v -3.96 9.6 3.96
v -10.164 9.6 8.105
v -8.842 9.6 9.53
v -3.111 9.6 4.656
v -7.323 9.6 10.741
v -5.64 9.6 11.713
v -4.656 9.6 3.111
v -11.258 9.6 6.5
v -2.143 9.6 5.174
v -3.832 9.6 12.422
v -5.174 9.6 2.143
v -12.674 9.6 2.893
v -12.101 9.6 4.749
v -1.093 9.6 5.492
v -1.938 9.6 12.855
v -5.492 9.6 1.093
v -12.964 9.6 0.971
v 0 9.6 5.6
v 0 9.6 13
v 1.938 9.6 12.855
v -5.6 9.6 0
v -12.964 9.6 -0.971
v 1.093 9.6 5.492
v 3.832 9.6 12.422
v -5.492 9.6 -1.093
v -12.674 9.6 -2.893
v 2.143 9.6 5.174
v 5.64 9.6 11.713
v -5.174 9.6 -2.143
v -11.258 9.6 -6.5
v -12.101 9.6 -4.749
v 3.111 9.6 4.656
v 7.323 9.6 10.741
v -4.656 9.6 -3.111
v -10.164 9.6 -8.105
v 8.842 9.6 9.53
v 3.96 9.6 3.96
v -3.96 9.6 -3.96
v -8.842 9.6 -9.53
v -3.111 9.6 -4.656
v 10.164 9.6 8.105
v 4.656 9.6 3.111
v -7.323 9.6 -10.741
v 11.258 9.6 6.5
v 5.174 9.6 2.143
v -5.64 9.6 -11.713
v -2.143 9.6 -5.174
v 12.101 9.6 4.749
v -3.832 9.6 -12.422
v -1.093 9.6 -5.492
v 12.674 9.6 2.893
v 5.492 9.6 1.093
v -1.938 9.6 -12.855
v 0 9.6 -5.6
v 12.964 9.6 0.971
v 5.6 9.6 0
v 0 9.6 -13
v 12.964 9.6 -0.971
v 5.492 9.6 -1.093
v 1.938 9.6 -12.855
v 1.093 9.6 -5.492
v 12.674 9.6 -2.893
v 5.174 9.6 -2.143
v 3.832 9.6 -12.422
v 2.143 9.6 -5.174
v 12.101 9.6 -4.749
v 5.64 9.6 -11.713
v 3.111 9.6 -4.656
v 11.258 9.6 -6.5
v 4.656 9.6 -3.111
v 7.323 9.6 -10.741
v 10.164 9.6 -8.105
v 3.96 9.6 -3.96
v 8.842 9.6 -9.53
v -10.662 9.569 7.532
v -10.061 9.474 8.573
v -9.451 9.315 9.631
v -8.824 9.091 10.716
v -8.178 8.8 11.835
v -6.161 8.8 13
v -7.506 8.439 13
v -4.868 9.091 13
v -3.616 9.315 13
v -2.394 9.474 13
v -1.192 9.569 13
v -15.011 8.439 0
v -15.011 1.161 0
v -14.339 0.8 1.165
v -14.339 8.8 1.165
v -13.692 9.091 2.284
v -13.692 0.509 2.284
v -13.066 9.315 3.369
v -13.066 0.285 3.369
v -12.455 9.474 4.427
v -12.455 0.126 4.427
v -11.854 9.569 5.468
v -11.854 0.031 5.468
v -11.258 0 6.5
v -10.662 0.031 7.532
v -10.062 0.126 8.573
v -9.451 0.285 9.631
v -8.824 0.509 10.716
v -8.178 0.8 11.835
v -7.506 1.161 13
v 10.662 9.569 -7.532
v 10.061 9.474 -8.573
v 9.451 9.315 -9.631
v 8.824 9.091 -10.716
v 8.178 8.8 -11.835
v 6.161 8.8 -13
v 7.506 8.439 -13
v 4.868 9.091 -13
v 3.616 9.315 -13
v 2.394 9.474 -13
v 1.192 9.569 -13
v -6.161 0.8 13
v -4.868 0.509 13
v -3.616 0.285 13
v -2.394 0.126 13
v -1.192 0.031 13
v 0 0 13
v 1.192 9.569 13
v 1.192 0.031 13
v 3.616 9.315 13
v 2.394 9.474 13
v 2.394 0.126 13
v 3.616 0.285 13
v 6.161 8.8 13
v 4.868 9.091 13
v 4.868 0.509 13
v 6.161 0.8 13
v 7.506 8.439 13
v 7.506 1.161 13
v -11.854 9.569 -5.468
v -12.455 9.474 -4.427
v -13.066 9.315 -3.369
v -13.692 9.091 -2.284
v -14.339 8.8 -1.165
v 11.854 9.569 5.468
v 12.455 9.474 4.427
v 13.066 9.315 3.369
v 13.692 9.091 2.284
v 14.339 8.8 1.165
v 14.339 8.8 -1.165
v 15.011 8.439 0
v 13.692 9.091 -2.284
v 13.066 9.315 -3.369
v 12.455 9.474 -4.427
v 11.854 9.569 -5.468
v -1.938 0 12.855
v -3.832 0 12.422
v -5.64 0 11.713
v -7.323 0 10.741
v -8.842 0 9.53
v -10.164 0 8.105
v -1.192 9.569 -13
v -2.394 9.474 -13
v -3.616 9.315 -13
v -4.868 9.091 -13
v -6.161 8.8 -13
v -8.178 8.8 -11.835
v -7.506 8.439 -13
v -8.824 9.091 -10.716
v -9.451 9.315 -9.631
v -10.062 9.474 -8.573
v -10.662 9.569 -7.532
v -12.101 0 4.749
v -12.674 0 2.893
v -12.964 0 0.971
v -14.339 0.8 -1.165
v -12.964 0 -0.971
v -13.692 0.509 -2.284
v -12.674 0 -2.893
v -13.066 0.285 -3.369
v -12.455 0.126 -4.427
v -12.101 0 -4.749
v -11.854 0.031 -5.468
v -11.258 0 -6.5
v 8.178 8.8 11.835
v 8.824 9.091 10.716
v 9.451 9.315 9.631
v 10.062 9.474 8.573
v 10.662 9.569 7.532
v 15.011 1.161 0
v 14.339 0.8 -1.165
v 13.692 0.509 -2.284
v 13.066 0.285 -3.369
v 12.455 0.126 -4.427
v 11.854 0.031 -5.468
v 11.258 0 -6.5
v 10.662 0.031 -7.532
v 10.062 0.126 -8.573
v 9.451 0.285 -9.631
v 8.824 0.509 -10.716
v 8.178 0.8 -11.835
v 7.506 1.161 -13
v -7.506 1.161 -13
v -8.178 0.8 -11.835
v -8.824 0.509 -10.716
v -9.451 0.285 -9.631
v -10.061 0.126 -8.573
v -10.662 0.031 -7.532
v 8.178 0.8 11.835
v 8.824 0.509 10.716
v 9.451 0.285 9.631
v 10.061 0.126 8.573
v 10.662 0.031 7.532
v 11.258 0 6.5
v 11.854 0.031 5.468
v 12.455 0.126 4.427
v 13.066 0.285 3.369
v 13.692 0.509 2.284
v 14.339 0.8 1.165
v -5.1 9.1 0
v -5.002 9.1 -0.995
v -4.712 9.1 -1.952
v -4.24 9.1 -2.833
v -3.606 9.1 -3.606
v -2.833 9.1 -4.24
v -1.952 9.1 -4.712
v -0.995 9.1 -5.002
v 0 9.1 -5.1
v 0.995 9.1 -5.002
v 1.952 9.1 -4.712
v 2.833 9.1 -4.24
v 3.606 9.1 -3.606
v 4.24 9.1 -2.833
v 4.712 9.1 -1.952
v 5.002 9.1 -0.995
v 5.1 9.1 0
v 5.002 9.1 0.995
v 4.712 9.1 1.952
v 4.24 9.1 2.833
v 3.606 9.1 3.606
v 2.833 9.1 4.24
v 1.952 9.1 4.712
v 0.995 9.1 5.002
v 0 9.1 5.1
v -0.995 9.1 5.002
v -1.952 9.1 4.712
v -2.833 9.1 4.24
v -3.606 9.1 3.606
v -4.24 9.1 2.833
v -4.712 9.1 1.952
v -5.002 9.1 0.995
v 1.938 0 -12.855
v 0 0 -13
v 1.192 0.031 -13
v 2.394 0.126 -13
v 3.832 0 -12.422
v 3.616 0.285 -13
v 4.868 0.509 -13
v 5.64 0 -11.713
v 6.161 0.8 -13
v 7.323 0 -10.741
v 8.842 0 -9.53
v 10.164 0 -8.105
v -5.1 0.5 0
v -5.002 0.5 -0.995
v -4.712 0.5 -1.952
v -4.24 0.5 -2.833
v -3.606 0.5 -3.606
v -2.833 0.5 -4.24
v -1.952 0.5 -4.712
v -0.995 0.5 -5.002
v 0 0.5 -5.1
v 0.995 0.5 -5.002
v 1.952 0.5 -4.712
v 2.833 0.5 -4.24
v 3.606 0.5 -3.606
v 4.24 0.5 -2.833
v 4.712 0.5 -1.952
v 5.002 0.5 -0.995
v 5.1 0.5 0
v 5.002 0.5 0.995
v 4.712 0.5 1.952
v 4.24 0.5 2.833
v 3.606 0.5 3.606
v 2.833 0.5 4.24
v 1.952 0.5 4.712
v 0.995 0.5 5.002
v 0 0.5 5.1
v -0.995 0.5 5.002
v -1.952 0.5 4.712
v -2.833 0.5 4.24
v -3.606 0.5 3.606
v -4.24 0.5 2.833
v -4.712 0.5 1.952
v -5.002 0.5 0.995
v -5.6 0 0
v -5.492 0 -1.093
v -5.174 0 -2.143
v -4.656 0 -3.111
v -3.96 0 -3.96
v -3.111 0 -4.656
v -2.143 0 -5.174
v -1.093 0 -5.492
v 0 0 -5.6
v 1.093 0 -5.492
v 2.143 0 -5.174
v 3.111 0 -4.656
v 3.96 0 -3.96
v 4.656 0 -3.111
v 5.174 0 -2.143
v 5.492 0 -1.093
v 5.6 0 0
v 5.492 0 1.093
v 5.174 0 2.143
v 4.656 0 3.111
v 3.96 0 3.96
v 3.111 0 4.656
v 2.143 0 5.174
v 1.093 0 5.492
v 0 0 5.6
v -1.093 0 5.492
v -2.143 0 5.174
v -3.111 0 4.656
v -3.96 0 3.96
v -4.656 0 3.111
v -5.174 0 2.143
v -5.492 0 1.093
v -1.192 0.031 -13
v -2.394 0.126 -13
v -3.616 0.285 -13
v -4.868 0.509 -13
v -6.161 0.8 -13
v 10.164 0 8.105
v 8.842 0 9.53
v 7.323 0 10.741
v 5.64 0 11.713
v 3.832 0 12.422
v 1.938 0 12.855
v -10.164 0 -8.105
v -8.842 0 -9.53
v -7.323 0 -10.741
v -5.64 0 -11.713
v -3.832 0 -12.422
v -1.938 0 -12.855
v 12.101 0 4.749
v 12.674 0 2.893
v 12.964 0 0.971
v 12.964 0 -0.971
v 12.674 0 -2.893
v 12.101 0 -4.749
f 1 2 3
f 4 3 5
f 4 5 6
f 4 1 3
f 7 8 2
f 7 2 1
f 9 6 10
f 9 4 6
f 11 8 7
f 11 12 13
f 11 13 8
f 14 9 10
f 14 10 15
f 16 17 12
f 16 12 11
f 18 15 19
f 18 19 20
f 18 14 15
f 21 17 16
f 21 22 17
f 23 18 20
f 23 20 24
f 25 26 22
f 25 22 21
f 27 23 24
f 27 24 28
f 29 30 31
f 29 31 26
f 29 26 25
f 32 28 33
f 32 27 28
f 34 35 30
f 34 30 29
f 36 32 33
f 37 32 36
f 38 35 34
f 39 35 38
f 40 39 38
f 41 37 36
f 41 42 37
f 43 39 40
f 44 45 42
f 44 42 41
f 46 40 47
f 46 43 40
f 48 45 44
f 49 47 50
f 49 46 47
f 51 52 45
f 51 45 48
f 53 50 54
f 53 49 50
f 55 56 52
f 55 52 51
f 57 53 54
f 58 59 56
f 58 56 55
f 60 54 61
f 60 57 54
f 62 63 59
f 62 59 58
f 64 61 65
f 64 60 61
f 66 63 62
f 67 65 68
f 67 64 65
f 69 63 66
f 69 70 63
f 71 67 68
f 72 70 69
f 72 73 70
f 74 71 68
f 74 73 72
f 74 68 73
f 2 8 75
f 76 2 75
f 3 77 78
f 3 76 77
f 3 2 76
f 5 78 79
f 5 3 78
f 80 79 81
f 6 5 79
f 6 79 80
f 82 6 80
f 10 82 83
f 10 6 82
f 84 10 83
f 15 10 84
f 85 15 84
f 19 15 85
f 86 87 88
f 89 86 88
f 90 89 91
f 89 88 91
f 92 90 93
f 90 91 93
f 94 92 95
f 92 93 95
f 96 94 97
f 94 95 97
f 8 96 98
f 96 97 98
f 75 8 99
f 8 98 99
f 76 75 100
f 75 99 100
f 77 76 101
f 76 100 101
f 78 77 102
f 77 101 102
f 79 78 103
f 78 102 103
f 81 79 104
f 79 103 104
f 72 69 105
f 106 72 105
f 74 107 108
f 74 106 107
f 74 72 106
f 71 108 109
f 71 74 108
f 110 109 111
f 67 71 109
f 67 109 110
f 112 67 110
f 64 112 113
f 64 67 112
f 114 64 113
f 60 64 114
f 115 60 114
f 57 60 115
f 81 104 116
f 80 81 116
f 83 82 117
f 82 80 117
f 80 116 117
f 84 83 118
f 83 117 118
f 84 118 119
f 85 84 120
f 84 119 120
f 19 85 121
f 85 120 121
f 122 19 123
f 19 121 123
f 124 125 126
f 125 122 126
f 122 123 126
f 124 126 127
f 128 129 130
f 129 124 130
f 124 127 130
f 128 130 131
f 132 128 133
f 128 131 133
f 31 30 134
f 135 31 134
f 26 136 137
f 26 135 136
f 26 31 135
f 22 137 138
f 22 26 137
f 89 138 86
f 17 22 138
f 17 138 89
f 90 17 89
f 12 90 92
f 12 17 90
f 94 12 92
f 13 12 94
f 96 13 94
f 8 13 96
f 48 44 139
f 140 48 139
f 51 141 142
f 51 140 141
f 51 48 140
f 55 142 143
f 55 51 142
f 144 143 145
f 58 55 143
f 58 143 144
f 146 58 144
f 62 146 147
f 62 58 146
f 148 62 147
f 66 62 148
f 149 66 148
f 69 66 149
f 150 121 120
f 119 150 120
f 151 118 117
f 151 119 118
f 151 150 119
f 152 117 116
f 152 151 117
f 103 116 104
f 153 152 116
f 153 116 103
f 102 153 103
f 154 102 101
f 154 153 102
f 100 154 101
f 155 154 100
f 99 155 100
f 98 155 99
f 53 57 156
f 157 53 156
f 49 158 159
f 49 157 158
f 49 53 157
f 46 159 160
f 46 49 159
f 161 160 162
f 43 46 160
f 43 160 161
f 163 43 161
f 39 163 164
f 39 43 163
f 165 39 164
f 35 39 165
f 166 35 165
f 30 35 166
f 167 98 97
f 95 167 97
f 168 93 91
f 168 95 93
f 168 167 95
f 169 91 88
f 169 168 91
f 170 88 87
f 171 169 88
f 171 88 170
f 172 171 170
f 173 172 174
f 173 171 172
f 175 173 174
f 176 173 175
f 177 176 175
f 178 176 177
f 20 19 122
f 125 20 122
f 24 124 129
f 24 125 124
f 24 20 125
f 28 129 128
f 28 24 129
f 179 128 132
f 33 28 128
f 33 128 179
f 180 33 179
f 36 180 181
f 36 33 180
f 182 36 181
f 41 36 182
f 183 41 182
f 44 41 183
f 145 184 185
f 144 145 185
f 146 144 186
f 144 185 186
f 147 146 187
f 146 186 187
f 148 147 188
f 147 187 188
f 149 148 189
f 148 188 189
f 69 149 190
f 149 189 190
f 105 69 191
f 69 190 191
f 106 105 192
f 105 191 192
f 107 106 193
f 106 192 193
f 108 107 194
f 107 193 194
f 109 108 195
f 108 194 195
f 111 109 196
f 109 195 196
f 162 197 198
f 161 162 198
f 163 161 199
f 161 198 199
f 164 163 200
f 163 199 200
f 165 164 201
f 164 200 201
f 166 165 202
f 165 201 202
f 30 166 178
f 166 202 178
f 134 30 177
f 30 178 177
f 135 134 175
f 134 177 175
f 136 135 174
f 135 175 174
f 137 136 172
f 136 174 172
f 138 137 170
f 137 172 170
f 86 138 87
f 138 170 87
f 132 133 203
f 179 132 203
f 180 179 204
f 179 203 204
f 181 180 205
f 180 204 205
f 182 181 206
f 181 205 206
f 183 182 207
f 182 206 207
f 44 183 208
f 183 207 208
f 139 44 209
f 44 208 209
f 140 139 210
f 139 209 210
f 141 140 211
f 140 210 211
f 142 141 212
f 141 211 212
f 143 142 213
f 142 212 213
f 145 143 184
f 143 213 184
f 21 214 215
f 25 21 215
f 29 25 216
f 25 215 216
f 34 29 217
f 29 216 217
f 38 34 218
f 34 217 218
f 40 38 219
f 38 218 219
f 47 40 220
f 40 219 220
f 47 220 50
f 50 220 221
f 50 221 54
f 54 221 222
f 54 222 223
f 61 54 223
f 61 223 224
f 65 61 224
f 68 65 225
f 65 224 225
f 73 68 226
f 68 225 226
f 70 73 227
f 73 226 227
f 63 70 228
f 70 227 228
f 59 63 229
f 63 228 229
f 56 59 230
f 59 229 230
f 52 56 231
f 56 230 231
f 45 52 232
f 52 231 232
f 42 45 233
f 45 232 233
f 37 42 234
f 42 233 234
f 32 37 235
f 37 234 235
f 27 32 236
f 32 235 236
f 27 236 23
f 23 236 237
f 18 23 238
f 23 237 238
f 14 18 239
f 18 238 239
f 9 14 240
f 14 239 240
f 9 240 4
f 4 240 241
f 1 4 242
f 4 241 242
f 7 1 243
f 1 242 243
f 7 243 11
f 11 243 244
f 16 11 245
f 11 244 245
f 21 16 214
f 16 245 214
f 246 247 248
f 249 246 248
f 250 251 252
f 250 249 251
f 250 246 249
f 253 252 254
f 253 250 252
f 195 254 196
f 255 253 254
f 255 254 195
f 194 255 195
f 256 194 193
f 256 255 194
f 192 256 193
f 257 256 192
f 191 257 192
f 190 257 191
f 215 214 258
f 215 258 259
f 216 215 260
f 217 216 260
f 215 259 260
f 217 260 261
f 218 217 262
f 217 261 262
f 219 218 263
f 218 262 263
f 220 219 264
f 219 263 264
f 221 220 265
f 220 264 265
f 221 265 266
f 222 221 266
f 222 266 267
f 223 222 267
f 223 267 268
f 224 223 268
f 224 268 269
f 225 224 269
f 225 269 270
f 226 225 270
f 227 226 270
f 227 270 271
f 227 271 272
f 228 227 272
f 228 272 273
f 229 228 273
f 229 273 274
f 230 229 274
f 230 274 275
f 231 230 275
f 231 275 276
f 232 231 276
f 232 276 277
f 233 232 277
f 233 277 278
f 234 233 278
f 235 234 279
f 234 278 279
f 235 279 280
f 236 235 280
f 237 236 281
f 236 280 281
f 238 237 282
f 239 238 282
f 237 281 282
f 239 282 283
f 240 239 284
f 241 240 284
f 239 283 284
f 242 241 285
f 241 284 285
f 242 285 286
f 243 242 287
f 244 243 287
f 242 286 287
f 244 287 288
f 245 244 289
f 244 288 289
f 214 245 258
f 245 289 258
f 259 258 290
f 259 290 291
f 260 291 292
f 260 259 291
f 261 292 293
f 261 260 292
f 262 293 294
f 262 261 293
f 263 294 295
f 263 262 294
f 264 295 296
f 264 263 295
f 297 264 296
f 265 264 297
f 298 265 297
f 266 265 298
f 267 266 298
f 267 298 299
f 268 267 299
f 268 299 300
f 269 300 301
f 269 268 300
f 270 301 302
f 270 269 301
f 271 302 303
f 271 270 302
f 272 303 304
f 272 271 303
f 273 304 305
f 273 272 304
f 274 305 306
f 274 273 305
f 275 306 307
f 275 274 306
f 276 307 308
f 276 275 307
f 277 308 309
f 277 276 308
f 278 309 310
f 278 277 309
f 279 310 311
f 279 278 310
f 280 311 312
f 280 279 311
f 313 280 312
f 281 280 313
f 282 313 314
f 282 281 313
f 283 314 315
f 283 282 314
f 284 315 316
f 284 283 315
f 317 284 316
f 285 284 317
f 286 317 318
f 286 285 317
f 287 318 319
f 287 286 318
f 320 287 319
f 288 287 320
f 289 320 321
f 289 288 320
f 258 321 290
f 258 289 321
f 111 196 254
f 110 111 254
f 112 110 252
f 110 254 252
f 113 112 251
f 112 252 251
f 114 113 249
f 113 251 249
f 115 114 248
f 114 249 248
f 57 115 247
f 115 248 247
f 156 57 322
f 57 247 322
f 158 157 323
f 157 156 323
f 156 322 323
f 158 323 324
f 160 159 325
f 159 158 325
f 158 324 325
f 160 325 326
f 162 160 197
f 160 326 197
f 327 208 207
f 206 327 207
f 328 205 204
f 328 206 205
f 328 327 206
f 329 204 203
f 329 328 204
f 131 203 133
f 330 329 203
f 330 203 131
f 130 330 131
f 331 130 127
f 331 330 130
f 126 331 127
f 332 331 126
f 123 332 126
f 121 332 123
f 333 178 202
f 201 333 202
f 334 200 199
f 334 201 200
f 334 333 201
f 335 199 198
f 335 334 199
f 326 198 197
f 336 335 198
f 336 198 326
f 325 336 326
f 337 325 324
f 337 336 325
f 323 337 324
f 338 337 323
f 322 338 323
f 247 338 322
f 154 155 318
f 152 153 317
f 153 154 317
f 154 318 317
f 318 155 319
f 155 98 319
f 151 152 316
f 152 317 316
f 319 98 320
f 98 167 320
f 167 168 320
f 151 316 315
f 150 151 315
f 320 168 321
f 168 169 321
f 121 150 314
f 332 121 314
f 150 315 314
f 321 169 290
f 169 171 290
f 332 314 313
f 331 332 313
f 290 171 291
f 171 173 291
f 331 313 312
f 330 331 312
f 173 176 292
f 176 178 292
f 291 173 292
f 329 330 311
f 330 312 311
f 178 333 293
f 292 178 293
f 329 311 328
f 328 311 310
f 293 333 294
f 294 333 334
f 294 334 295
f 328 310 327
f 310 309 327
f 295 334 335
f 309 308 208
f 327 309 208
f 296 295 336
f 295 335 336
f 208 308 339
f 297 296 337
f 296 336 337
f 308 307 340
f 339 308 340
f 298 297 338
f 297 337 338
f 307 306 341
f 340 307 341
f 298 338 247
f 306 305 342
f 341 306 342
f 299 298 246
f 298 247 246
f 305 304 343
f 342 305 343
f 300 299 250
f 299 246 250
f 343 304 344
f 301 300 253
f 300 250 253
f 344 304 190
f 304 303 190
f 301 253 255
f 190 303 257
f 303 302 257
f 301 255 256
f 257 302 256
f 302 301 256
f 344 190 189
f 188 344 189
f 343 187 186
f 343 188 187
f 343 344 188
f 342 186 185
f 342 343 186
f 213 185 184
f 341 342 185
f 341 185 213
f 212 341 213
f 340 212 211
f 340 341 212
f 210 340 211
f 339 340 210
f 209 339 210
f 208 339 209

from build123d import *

# Parameters (mm, degrees)
BOSS_EXTRUDE1_DEPTH    = 9.6
SKETCH2_OUTSIDE_W      = 73.45
SKETCH2_OUTSIDE_H      = 69.428
SKETCH2_OUTSIDE_R      = 13
CUT_EXTRUDE1_DEPTH     = 9.6
CUT_EXTRUDE1_DRAFT     = -60
SKETCH3_OUTSIDE_W      = 73.45
SKETCH3_OUTSIDE_H      = 69.428
SKETCH3_OUTSIDE_R      = 13
CUT_EXTRUDE2_DEPTH     = 9.6
CUT_EXTRUDE2_DRAFT     = -60
M12_TAPPED_HOLE1_D     = 10.2
M12_TAPPED_HOLE1_DEPTH = 32.75
CHAMFER1_SIZE          = 0.5


with BuildPart() as part:
    # Sketch1 → Boss-Extrude1 (new body)
    with BuildSketch(Plane(origin=(0, 0, 0), x_dir=(1, 0, 0), z_dir=(0, 1, 0))):
        Polygon((15.011106999, 0), (7.505553499, 13), (-7.505553499, 13), (-15.011106999, 0), (-7.505553499, -13), (7.505553499, -13), align=None)
    extrude(amount=BOSS_EXTRUDE1_DEPTH)


with BuildPart() as cut_extrude1_tool:
    # Sketch2 outside → Cut-Extrude1 (with draft: the straight prism first)
    with BuildSketch(Plane(origin=(0, 9.6, 0), x_dir=(1, 0, 0), z_dir=(0, 1, 0))):
        Rectangle(SKETCH2_OUTSIDE_W, SKETCH2_OUTSIDE_H)
        Circle(SKETCH2_OUTSIDE_R, mode=Mode.SUBTRACT)
    extrude(amount=-CUT_EXTRUDE1_DEPTH)
    # Cut-Extrude1: the draft: its side faces are tilted about the plane it starts from
    cut_extrude1_sides = [cut_extrude1_tool.faces().sort_by_distance(p)[0] for p in [
        (0, 4.8, 34.714),
        (36.725, 4.8, 0),
        (0, 4.8, -34.714),
        (-36.725, 4.8, 0),
        (-13, 4.8, 0),
    ]]
    draft(cut_extrude1_sides, Plane(origin=(0, 9.6, 0), x_dir=(1, 0, 0), z_dir=(0, 1, 0)), CUT_EXTRUDE1_DRAFT)


with BuildPart() as part_1:
    add(part.part)

    # Cut-Extrude1: cut by cut_extrude1_tool
    add(cut_extrude1_tool.part, mode=Mode.SUBTRACT)


with BuildPart() as cut_extrude2_tool:
    # Sketch3 outside → Cut-Extrude2 (with draft: the straight prism first)
    with BuildSketch(Plane.XZ):
        Rectangle(SKETCH3_OUTSIDE_W, SKETCH3_OUTSIDE_H)
        Circle(SKETCH3_OUTSIDE_R, mode=Mode.SUBTRACT)
    extrude(amount=-CUT_EXTRUDE2_DEPTH)
    # Cut-Extrude2: the draft: its side faces are tilted about the plane it starts from
    cut_extrude2_sides = [cut_extrude2_tool.faces().sort_by_distance(p)[0] for p in [
        (0, 4.8, -34.714),
        (36.725, 4.8, 0),
        (0, 4.8, 34.714),
        (-36.725, 4.8, 0),
        (-13, 4.8, 0),
    ]]
    draft(cut_extrude2_sides, Plane.XZ, CUT_EXTRUDE2_DRAFT)


with BuildPart() as part_2:
    add(part_1.part)

    # Cut-Extrude2: cut by cut_extrude2_tool
    add(cut_extrude2_tool.part, mode=Mode.SUBTRACT)

    # M12 Tapped Hole1
    with Locations(Plane(origin=(0, 9.6, 0), x_dir=(1, 0, 0), z_dir=(0, 1, 0))):
        with Locations((0, 0)):
            Hole(M12_TAPPED_HOLE1_D / 2, depth=M12_TAPPED_HOLE1_DEPTH)

    # Chamfer1
    chamfer1_edges = [part_2.edges().sort_by_distance(p)[0] for p in [
        (5.1, 0, 0),
        (5.1, 9.6, 0),
    ]]
    chamfer(chamfer1_edges, length=CHAMFER1_SIZE)


solid = part_2.part
